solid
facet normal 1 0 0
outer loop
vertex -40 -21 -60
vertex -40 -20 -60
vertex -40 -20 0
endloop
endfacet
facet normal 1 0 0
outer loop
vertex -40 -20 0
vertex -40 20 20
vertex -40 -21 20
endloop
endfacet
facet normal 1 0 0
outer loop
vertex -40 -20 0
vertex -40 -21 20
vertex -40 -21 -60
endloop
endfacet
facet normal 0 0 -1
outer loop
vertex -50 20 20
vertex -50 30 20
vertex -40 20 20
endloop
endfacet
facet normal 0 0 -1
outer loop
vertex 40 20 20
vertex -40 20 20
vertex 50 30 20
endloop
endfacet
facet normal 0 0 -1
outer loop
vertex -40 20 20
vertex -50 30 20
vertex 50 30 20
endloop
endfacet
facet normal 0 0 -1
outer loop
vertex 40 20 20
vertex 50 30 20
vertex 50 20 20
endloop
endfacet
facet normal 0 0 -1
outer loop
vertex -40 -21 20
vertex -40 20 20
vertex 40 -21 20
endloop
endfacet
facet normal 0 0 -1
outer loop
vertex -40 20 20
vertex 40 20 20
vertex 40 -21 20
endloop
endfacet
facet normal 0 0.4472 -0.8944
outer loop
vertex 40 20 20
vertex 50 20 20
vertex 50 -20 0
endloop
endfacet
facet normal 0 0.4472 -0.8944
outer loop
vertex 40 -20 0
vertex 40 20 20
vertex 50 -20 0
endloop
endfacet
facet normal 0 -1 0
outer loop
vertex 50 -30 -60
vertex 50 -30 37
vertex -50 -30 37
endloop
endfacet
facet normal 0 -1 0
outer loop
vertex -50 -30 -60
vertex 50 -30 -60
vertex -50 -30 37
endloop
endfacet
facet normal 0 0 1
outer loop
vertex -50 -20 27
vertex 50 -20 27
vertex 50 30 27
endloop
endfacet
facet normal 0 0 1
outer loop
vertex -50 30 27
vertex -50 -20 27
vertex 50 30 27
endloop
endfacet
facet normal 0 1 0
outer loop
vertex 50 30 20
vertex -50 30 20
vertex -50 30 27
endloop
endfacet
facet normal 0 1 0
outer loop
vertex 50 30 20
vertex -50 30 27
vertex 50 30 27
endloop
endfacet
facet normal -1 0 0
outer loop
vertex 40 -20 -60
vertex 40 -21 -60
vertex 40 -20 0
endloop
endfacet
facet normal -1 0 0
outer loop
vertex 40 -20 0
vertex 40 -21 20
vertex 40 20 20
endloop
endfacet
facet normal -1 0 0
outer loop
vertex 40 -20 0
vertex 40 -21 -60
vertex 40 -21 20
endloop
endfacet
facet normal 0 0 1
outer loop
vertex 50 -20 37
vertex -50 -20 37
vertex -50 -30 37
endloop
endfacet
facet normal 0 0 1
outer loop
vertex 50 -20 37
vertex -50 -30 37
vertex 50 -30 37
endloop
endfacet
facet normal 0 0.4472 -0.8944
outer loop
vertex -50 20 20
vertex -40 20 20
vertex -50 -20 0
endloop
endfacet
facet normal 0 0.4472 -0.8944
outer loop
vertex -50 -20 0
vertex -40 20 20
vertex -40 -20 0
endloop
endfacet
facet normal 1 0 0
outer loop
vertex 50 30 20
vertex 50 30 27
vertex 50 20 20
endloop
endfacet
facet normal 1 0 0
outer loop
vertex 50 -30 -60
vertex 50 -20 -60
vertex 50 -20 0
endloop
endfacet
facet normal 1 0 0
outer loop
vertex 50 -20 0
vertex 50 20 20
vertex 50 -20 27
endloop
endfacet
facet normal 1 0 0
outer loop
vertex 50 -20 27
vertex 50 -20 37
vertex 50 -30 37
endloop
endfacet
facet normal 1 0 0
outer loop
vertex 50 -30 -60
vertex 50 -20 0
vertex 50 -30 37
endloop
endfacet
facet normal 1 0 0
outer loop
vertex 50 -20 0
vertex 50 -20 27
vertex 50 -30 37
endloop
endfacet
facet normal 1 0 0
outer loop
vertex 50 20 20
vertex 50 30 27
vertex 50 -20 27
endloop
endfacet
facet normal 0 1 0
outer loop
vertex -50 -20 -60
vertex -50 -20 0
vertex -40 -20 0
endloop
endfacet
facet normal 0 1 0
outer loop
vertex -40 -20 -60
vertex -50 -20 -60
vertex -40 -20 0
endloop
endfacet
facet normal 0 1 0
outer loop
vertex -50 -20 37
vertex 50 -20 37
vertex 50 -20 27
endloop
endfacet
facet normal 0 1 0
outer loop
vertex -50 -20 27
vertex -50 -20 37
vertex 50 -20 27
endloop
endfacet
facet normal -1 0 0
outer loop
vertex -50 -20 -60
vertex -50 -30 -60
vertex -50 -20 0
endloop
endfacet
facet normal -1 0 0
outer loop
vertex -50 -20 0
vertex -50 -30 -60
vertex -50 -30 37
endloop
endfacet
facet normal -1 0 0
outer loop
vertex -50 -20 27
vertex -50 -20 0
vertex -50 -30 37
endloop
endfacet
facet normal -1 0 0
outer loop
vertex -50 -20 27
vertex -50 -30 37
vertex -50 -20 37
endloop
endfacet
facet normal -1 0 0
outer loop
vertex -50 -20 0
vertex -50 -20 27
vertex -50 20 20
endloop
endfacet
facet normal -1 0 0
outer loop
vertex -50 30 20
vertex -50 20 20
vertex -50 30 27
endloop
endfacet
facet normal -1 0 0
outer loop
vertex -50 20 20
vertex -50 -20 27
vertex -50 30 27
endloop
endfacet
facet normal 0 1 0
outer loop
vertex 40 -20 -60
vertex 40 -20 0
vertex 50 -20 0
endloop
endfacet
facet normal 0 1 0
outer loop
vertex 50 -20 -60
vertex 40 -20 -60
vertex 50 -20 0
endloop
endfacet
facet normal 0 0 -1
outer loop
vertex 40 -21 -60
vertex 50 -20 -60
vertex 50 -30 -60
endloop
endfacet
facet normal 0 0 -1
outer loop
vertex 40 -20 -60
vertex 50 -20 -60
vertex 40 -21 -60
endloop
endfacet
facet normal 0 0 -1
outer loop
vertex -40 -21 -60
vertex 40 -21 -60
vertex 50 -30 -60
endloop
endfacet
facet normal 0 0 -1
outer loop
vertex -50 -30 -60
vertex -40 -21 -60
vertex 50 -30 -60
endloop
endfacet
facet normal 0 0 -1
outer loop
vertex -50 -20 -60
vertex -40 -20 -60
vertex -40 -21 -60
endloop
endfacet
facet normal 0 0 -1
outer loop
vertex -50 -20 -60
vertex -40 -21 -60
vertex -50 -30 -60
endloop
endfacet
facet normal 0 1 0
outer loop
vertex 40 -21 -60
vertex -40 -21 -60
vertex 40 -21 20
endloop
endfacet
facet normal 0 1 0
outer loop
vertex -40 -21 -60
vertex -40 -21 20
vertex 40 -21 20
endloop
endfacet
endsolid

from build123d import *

# Parameters (mm, degrees)
SKETCH_1_W          = 100
SKETCH_1_H          = 60
EXTRUDE_1_DEPTH     = 37
SKETCH_2_W          = 10
SKETCH_2_H          = 50
CUT_EXTRUDE_1_DEPTH = 111.7655181
SKETCH_3_W          = 80
SKETCH_3_H          = 20
CUT_EXTRUDE_2_DEPTH = 50
CUT_EXTRUDE_3_DEPTH = 111.7655181
SKETCH_5_W          = 80
SKETCH_5_H          = 20
CUT_EXTRUDE_4_DEPTH = 1
EXTRUDE_2_DEPTH     = 60


with BuildPart() as part:
    # 草图1 → 凸台-拉伸1 (new body)
    with BuildSketch(Plane.XY):
        Rectangle(SKETCH_1_W, SKETCH_1_H)
    extrude(amount=EXTRUDE_1_DEPTH)

    # 草图2 → 切除-拉伸1 (cut, through all)
    with BuildSketch(Plane(origin=(50, 0, 0), x_dir=(0, 0, -1), z_dir=(1, 0, 0))):
        with Locations((-32, 5)):
            Rectangle(SKETCH_2_W, SKETCH_2_H)
    extrude(amount=-CUT_EXTRUDE_1_DEPTH, mode=Mode.SUBTRACT)

    # 草图3 → 切除-拉伸2 (cut)
    with BuildSketch(Plane(origin=(0, 30, 0), x_dir=(1, 0, 0), z_dir=(0, 1, 0))):
        with Locations((0, -10)):
            Rectangle(SKETCH_3_W, SKETCH_3_H)
    extrude(amount=-CUT_EXTRUDE_2_DEPTH, mode=Mode.SUBTRACT)

    # 草图4 → 切除-拉伸3 (cut, through all)
    with BuildSketch(Plane(origin=(50, 0, 0), x_dir=(0, 0, -1), z_dir=(1, 0, 0))):
        Polygon((0, 30), (-20, 30), (-20, 20), (0, -20), align=None)
    extrude(amount=-CUT_EXTRUDE_3_DEPTH, mode=Mode.SUBTRACT)

    # 草图5 → 切除-拉伸4 (cut)
    with BuildSketch(Plane(origin=(0, -20, 0), x_dir=(1, 0, 0), z_dir=(0, 1, 0))):
        with Locations((0, -10)):
            Rectangle(SKETCH_5_W, SKETCH_5_H)
    extrude(amount=-CUT_EXTRUDE_4_DEPTH, mode=Mode.SUBTRACT)

    # 草图7 → 凸台-拉伸2 (add)
    with BuildSketch(Plane(origin=(0, 0, 0), x_dir=(-1, 0, 0), z_dir=(0, 0, -1))):
        Polygon((50, -20), (40, -20), (40, -21), (-40, -21), (-40, -20), (-50, -20), (-50, -30), (50, -30), align=None)
    extrude(amount=EXTRUDE_2_DEPTH)


solid = part.part
